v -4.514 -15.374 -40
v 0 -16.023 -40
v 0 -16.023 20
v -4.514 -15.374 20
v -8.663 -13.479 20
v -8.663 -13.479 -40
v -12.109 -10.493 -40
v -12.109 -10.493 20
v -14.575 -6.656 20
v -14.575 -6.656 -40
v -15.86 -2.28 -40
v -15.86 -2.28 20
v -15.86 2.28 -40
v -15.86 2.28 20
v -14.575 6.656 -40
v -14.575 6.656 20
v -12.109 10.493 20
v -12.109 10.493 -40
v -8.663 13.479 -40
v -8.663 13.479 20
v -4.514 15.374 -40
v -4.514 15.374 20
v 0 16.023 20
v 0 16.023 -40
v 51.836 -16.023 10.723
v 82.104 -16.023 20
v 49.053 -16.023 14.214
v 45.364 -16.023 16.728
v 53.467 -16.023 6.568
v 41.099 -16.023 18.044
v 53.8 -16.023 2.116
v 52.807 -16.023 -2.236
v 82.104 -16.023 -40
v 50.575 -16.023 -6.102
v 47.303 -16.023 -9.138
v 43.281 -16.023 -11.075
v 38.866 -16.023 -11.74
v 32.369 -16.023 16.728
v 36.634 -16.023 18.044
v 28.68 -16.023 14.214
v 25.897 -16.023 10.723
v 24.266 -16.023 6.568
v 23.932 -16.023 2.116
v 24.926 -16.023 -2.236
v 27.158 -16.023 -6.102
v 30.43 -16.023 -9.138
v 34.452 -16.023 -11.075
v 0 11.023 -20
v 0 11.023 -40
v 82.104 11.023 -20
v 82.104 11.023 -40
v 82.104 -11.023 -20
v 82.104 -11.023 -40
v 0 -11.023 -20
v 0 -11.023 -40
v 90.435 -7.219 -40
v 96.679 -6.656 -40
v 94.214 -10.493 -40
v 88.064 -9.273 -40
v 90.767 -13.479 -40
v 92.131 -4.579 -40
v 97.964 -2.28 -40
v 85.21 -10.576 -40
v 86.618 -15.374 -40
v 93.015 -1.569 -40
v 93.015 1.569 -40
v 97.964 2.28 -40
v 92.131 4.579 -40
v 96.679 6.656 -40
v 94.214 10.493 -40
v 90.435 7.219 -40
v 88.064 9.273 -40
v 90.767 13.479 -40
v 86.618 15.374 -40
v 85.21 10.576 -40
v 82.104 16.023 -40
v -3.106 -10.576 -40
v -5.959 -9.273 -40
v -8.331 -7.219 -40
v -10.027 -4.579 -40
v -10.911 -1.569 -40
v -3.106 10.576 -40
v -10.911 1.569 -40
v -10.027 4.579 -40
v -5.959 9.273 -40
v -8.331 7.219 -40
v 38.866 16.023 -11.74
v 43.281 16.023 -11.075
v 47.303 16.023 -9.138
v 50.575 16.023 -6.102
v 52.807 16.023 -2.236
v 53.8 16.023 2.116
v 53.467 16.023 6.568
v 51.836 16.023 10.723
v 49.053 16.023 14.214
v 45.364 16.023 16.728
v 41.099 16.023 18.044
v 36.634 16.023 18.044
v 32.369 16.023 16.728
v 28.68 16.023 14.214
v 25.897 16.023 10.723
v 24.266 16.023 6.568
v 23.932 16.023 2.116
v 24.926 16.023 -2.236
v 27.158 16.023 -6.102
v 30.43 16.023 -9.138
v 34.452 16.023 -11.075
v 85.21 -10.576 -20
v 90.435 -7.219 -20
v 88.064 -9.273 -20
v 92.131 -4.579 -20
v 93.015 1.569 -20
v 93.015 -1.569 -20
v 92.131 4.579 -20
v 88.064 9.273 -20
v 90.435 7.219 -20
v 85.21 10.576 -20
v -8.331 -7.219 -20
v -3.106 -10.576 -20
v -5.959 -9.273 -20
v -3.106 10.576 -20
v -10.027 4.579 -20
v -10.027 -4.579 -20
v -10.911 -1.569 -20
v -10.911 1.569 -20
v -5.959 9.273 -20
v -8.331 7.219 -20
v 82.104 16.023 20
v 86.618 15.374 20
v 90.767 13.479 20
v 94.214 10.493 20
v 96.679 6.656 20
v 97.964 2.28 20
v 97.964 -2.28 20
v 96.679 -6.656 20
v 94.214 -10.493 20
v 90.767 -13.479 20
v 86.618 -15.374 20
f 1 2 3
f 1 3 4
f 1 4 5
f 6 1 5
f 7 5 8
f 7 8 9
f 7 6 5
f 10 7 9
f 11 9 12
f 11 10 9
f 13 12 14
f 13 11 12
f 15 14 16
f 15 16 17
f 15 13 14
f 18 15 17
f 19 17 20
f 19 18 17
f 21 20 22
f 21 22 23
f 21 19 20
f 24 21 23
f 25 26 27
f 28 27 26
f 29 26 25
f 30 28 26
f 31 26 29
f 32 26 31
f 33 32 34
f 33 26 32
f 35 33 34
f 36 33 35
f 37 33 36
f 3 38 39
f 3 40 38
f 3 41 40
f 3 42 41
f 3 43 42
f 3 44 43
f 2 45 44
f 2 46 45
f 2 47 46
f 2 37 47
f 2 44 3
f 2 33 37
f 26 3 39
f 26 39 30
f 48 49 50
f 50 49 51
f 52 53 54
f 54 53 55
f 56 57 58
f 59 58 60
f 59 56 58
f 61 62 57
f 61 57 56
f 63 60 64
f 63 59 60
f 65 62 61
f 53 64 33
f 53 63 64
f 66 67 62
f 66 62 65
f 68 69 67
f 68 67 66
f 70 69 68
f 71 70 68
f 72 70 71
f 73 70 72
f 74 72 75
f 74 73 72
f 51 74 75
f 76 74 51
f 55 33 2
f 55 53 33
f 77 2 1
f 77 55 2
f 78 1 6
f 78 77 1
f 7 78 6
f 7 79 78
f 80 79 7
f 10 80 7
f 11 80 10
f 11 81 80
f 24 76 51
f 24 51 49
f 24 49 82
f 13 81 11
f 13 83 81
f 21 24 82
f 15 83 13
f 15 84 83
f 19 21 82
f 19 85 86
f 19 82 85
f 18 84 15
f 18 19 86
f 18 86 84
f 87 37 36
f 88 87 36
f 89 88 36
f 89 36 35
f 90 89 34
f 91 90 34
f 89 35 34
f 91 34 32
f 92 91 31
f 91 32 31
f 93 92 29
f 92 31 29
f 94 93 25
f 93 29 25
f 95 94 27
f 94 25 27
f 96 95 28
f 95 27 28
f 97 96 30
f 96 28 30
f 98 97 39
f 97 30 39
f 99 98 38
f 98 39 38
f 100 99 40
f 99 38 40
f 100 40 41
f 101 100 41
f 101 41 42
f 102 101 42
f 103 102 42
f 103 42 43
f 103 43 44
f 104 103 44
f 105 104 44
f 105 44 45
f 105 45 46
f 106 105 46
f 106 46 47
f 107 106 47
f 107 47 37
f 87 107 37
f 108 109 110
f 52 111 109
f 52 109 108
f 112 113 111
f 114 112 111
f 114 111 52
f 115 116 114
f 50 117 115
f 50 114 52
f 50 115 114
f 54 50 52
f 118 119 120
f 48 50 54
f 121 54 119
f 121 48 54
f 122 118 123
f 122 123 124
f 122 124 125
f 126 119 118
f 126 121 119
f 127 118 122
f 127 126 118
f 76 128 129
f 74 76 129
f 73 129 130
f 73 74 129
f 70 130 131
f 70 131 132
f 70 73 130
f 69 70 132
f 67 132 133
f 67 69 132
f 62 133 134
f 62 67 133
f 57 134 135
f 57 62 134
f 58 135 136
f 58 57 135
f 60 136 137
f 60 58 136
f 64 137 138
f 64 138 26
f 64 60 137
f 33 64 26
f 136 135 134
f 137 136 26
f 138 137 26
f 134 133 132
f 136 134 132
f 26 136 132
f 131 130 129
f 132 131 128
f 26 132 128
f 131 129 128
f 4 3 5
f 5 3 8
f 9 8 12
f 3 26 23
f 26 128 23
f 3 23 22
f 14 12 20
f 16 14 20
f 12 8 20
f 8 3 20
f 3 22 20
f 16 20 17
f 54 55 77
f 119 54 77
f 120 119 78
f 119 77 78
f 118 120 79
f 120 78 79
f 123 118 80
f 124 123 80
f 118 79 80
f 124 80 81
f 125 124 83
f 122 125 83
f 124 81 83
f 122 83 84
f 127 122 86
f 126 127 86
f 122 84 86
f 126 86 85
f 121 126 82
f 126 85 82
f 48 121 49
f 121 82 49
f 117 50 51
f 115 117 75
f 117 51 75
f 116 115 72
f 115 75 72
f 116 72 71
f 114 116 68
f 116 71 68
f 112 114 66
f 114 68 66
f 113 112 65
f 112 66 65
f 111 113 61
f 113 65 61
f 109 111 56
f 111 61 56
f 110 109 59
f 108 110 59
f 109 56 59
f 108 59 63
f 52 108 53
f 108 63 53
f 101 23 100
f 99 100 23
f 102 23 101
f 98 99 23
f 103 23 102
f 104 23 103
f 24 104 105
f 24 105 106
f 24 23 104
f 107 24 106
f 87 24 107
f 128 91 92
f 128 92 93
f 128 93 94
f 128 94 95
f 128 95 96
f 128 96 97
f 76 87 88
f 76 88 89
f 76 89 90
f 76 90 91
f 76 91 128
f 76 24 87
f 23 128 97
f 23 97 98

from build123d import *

# Parameters (mm, degrees)
EXTRUDE_1_DEPTH      = 20
EXTRUDE_1_DEPTH_BACK = 20
EXTRUDE_START        = 20
EXTRUDE_1_2_DEPTH    = 20
SKETCH_3_R           = 14.975860866
CUT_EXTRUDE_1_DEPTH  = 111.706390972


with BuildPart() as part:
    # 草图1 → Extrude 1 (new, two sides: drawn at the far end of the back side and taken through both)
    with BuildSketch(Plane.XY.offset(-EXTRUDE_1_DEPTH_BACK)):
        with BuildLine():
            Line((0, 16.022995164), (82.104266624, 16.022995164))
            ThreePointArc((82.104266624, 16.022995164), (98.127261788, 0), (82.104266624, -16.022995164))
            Line((82.104266624, -16.022995164), (0, -16.022995164))
            ThreePointArc((0, -16.022995164), (-16.022995164, 0), (0, 16.022995164))
        make_face()
    extrude(amount=EXTRUDE_1_DEPTH + EXTRUDE_1_DEPTH_BACK)

    # 草图2 → Extrude 1 2 (add)
    with BuildSketch(Plane(origin=(0, 0, -20), x_dir=(-1, 0, 0), z_dir=(0, 0, -1)).offset(EXTRUDE_START)):
        with BuildLine():
            Line((-82.104266624, -16.022995164), (0, -16.022995164))
            ThreePointArc((0, -16.022995164), (16.022995164, 0), (0, 16.022995164))
            Line((0, 16.022995164), (-82.104266624, 16.022995164))
            ThreePointArc((-82.104266624, 16.022995164), (-98.127261788, 0), (-82.104266624, -16.022995164))
        make_face()
        with BuildLine():
            Line((-82.104266624, -11.022995164), (0, -11.022995164))
            ThreePointArc((0, -11.022995164), (11.022995164, 0), (0, 11.022995164))
            Line((0, 11.022995164), (-82.104266624, 11.022995164))
            ThreePointArc((-82.104266624, 11.022995164), (-93.127261788, 0), (-82.104266624, -11.022995164))
        make_face(mode=Mode.SUBTRACT)
    extrude(amount=-EXTRUDE_1_2_DEPTH)

    # 草图3 → 切除-拉伸1 (cut, through all)
    with BuildSketch(Plane.XZ.offset(16.022995164)):
        with Locations((38.866467132, 3.235422981)):
            Circle(SKETCH_3_R)
    extrude(amount=-CUT_EXTRUDE_1_DEPTH, mode=Mode.SUBTRACT)


solid = part.part
